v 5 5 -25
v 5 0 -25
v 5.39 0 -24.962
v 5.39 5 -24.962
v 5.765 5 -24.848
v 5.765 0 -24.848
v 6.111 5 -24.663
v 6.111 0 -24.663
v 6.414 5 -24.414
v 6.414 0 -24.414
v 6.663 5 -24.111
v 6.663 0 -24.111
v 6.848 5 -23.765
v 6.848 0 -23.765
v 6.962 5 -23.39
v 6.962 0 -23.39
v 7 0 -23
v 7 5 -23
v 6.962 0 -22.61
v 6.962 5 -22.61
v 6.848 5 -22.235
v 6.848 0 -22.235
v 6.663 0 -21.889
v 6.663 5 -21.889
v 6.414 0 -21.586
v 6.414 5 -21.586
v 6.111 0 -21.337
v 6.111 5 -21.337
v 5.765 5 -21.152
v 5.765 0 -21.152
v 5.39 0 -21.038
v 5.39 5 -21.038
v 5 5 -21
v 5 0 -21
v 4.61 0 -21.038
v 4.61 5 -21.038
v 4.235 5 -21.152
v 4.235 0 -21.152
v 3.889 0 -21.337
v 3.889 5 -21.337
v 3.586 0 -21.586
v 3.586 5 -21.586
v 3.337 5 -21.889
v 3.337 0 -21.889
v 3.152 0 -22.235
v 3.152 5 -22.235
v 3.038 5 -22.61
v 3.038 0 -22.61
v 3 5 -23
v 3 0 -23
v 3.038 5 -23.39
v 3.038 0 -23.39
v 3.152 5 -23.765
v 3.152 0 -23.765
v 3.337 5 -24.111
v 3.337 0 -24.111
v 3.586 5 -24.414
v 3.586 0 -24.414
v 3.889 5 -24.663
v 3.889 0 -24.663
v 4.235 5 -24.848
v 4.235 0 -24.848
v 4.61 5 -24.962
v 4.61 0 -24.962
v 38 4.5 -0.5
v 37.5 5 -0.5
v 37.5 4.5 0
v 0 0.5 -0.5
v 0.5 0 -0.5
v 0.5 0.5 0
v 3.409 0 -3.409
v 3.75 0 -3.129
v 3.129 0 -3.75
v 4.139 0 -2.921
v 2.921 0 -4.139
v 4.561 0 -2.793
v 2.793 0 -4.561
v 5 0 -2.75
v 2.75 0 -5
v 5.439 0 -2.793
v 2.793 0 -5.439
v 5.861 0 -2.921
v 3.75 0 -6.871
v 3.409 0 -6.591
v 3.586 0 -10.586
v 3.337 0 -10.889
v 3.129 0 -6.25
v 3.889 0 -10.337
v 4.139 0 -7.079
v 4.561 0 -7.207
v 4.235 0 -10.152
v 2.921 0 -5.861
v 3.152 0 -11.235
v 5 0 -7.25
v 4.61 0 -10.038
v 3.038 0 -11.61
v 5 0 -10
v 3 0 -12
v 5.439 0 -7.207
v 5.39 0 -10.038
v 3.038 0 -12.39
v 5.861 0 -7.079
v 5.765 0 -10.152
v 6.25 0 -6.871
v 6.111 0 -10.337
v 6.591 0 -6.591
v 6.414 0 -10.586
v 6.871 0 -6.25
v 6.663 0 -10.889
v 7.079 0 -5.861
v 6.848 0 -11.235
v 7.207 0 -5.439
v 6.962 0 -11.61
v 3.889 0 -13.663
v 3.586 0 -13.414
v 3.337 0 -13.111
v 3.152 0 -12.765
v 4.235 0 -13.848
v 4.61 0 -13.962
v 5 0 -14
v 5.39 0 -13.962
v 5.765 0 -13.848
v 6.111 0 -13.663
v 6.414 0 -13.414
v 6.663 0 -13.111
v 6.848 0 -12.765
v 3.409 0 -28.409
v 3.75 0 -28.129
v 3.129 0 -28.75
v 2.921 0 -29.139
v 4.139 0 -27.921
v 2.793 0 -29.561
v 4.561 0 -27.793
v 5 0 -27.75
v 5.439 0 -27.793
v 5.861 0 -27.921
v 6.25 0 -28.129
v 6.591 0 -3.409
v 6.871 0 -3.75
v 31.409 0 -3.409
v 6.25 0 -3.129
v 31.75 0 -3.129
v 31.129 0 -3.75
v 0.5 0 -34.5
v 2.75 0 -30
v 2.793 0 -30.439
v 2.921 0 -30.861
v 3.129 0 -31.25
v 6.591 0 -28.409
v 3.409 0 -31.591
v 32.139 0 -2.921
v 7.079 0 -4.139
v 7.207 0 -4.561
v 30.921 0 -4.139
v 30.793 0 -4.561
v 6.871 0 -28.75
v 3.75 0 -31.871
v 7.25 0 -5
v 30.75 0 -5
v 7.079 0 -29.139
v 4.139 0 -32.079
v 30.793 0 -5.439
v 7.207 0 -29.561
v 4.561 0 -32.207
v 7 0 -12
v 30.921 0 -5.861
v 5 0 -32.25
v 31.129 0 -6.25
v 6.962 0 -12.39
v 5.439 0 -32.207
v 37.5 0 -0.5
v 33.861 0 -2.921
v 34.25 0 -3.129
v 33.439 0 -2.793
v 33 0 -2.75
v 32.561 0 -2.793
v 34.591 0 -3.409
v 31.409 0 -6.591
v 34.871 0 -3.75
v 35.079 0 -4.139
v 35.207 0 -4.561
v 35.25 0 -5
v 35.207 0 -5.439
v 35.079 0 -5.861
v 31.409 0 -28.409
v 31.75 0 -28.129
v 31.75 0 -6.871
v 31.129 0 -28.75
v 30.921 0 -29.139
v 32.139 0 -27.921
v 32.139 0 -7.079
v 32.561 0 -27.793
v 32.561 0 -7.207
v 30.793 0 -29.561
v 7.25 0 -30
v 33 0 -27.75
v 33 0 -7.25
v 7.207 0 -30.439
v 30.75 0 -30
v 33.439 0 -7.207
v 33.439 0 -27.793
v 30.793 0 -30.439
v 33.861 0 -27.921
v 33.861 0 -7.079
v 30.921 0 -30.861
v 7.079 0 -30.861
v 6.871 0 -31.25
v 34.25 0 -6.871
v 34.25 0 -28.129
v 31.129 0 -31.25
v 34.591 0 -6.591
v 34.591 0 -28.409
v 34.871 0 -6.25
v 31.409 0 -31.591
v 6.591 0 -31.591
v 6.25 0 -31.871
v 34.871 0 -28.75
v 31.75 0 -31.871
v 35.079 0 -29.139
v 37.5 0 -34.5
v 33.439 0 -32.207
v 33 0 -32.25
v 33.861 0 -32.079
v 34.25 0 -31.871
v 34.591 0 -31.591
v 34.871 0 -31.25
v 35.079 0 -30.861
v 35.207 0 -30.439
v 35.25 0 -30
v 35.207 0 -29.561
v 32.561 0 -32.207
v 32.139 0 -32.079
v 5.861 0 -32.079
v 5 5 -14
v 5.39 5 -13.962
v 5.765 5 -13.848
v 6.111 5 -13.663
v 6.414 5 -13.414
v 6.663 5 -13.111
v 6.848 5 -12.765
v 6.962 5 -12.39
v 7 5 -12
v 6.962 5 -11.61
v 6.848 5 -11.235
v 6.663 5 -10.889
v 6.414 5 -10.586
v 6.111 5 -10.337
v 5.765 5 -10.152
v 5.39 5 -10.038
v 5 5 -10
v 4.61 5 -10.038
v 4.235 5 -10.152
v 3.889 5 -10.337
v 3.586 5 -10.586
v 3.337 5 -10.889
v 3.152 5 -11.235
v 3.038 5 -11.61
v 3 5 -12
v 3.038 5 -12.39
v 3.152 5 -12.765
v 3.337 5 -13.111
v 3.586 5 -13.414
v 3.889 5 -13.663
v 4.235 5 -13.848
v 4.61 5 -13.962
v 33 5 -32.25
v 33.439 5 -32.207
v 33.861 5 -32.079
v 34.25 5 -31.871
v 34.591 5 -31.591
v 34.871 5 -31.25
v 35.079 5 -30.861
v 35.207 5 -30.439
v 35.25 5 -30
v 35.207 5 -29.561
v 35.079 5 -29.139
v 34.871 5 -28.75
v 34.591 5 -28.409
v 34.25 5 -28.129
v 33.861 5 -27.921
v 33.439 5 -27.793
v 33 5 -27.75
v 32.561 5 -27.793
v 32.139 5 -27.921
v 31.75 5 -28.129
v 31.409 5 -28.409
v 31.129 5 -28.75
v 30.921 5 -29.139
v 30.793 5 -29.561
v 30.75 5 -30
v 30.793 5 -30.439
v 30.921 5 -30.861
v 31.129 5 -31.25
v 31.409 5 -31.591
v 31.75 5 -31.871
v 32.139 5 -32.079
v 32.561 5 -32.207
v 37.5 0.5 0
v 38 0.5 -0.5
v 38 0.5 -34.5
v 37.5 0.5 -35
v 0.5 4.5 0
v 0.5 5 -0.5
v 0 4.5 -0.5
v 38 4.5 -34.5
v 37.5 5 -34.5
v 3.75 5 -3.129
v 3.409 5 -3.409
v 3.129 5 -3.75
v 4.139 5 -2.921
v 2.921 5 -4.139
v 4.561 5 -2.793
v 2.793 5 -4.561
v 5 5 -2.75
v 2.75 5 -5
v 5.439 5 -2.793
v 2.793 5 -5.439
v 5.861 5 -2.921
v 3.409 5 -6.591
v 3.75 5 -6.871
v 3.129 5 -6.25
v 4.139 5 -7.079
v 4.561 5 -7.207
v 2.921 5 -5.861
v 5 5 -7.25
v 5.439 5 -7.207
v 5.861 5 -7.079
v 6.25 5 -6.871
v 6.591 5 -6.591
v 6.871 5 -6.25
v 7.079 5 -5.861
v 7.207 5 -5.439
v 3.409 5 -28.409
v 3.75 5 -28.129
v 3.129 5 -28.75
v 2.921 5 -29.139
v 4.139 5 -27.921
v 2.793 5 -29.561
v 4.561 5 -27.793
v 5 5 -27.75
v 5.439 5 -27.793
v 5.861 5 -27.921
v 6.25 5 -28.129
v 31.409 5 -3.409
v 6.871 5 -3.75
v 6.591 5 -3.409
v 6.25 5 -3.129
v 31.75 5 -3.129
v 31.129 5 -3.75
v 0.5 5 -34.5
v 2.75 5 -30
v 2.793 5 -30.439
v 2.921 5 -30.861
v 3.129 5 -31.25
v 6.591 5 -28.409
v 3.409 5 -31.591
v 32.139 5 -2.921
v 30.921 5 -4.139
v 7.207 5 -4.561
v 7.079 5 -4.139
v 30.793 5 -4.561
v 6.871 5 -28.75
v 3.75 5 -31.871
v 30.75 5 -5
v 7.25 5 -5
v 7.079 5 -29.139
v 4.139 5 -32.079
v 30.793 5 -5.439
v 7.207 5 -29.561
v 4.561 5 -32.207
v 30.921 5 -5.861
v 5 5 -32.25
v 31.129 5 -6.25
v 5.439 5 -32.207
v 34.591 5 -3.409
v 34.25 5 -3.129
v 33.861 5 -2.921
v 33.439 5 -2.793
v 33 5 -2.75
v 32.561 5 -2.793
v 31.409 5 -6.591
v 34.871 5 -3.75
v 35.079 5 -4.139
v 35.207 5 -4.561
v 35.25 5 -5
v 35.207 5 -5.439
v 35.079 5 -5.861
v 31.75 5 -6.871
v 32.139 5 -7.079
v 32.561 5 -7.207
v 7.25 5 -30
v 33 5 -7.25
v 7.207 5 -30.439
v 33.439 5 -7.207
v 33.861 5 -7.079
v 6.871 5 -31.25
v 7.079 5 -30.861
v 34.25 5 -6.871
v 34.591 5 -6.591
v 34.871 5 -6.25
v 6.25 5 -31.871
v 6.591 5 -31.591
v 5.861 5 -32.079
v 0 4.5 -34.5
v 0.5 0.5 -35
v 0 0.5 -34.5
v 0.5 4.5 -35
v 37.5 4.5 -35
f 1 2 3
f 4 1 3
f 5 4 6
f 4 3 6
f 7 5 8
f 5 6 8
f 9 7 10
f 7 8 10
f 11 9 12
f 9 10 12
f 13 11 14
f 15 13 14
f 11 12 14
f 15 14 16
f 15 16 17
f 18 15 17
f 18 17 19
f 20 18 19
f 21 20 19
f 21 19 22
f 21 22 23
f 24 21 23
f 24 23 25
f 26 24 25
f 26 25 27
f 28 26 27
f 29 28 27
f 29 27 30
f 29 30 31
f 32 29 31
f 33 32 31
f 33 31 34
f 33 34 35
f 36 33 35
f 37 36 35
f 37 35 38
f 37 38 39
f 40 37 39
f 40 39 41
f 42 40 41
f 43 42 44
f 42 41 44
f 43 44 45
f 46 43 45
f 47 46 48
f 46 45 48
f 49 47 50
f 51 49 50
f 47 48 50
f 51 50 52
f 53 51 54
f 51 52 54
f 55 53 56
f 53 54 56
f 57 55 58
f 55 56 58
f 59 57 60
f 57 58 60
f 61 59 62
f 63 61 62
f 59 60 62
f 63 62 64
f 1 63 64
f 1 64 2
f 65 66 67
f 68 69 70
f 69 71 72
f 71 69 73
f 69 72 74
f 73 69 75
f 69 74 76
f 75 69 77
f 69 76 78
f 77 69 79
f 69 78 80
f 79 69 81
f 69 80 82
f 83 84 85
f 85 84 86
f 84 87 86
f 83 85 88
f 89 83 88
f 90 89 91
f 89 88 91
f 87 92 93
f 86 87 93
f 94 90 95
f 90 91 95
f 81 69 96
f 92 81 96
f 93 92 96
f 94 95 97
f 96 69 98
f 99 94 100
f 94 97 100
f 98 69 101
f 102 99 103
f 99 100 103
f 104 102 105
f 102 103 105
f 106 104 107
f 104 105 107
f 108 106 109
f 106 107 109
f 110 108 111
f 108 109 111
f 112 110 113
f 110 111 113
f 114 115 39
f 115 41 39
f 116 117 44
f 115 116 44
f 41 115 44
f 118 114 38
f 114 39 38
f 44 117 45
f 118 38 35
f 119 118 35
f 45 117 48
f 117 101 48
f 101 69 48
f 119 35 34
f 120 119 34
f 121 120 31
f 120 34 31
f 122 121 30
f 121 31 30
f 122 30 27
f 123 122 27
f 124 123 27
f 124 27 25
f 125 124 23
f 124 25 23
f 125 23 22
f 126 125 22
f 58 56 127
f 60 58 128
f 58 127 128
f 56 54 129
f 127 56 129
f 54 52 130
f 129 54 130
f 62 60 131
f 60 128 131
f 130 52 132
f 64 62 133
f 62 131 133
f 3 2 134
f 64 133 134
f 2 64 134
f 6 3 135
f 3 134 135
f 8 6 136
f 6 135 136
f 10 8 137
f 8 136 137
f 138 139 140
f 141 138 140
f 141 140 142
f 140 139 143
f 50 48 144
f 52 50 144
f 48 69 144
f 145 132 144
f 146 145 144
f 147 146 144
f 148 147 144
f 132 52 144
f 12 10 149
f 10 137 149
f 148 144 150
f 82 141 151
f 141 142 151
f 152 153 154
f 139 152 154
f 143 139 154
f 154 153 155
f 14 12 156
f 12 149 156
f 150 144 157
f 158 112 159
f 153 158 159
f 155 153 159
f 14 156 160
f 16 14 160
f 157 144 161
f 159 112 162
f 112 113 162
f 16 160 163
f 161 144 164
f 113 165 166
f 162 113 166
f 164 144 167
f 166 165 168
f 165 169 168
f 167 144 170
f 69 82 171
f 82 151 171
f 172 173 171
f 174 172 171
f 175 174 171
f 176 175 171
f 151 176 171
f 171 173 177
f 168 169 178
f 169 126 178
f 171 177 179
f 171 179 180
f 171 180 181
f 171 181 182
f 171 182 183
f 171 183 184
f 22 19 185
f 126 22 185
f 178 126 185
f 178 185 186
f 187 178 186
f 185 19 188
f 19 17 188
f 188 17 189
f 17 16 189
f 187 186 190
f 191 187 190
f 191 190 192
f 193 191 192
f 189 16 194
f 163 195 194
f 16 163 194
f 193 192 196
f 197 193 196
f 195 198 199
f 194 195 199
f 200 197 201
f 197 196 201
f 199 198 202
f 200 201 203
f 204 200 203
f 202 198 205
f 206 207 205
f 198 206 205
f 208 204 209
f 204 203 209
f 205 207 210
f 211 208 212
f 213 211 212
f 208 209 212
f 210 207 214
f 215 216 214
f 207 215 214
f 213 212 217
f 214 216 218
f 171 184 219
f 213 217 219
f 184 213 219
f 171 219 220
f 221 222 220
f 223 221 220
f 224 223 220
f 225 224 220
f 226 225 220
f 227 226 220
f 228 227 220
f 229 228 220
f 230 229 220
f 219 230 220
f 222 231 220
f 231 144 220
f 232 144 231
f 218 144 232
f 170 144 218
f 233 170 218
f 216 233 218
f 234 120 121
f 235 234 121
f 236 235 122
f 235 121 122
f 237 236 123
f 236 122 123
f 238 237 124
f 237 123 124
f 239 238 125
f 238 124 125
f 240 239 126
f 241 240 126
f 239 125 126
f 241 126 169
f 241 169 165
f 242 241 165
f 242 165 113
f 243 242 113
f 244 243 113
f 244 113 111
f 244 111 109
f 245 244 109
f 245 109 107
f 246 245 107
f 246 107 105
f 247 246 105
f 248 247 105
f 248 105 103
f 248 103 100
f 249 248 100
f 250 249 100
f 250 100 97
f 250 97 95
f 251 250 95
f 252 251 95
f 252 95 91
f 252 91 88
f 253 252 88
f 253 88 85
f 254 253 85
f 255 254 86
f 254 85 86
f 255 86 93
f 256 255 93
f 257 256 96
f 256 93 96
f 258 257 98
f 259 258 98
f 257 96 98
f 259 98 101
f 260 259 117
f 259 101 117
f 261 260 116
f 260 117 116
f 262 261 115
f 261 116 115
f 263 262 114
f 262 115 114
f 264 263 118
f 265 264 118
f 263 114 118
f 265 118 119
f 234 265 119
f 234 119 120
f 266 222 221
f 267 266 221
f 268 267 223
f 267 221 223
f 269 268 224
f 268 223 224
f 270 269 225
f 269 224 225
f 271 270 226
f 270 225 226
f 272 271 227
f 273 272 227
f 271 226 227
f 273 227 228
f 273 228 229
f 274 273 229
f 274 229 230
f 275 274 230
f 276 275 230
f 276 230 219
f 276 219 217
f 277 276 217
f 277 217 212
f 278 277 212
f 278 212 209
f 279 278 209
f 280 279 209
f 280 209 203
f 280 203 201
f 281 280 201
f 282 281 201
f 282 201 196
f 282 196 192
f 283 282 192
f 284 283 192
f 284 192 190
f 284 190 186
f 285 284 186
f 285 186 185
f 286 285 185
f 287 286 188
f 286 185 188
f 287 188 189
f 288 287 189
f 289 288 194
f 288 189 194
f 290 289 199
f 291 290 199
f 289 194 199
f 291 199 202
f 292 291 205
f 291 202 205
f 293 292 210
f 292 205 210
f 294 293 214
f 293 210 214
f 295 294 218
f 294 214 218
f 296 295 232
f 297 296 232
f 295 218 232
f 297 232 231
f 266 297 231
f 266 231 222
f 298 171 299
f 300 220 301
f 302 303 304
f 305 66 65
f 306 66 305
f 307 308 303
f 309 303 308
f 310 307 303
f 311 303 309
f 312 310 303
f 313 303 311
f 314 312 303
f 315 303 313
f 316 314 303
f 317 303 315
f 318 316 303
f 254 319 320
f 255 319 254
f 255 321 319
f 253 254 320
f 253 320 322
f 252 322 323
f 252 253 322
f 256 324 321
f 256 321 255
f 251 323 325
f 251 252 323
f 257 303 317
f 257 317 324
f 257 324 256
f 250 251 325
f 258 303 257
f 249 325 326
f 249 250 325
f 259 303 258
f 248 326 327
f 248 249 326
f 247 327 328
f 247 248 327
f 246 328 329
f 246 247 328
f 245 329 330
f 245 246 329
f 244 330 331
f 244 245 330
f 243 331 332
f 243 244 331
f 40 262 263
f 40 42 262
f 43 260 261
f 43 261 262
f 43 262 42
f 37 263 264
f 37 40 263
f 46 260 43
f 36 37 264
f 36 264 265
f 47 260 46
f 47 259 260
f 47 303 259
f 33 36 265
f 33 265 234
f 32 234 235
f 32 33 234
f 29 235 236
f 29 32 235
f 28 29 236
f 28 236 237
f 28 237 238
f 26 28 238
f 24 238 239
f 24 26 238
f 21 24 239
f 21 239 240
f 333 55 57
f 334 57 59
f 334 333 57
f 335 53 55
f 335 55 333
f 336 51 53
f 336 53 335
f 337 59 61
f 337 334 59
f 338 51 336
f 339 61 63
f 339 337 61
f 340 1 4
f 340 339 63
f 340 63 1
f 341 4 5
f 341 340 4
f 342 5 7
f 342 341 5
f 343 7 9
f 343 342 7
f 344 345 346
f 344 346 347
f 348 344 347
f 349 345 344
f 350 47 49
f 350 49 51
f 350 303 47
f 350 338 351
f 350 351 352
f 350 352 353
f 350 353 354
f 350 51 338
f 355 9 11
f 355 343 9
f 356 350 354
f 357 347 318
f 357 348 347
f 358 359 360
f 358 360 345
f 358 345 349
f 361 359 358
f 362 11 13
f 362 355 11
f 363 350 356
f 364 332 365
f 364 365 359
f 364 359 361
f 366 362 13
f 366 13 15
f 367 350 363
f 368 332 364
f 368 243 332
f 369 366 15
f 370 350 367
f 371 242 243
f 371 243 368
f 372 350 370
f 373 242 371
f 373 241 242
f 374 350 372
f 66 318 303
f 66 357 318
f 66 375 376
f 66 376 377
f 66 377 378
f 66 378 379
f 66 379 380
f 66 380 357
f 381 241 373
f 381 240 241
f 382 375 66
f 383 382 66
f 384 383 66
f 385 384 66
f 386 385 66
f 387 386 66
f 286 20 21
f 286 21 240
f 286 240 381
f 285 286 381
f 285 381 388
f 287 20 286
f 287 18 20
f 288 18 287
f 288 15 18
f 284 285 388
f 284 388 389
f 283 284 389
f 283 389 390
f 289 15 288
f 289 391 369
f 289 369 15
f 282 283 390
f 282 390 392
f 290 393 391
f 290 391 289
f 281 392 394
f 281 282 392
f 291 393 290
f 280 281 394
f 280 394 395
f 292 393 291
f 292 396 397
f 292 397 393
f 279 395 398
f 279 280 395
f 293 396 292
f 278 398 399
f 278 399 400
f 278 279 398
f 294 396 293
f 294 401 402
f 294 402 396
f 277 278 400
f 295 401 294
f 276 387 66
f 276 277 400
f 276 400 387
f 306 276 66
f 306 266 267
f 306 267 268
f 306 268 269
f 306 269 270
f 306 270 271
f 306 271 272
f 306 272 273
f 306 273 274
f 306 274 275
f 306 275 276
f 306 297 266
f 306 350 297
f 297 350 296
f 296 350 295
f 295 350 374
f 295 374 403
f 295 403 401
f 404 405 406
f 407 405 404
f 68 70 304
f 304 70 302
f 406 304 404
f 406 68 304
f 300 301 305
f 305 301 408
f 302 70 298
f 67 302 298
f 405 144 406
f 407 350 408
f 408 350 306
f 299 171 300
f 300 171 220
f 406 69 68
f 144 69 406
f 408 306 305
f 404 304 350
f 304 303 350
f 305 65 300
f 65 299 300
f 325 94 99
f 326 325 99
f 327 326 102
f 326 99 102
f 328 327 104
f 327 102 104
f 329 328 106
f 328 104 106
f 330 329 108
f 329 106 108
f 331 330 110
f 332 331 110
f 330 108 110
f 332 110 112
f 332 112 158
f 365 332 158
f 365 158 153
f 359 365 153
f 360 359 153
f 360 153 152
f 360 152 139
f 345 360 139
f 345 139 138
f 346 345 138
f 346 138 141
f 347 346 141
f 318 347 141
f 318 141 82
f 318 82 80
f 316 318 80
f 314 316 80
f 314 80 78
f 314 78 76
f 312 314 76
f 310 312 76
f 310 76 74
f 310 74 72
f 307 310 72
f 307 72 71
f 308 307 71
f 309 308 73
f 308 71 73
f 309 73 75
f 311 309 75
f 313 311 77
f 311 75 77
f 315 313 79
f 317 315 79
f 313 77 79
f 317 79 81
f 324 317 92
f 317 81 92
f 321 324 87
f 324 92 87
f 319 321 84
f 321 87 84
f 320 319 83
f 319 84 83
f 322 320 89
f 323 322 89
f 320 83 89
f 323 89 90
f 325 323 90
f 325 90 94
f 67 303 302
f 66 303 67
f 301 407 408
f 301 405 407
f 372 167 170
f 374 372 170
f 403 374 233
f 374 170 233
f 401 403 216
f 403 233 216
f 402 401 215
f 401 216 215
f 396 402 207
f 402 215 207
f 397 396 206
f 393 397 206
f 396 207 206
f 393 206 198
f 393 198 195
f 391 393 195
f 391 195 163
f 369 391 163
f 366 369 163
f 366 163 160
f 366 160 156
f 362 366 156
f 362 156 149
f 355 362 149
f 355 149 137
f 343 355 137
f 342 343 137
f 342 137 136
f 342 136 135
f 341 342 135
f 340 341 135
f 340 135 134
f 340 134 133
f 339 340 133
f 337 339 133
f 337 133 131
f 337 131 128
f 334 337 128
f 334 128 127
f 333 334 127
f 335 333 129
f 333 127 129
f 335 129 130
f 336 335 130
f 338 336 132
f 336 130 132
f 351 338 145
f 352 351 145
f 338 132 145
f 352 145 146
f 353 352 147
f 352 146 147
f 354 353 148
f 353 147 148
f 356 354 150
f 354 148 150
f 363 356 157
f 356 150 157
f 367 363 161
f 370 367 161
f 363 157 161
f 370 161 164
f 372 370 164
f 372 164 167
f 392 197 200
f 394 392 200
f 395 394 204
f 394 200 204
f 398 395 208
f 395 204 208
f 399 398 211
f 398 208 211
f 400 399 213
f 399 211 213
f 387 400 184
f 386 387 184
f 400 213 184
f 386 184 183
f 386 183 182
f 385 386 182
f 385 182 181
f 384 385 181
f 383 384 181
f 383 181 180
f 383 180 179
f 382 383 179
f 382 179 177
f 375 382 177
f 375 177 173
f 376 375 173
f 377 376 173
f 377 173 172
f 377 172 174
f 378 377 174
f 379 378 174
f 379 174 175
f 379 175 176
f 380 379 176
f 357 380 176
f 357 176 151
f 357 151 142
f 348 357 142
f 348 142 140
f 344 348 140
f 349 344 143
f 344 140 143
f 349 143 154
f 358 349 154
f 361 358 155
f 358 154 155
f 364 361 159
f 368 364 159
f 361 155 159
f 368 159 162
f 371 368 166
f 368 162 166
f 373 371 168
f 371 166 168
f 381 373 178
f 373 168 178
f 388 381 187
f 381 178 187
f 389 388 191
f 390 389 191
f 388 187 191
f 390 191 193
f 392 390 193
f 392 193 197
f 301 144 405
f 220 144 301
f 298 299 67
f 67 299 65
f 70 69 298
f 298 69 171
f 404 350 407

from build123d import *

# Parameters (mm, degrees)
SKETCH_1_W          = 38
SKETCH_1_H          = 35
EXTRUDE_1_DEPTH     = 5
CHAMFER_1_SIZE      = 0.5
SKETCH_2_R          = 2.25
SKETCH_2_R_2        = 2
CUT_EXTRUDE_1_DEPTH = 52.903757089


with BuildPart() as part:
    # 草图1 → 凸台-拉伸1 (new body)
    with BuildSketch(Plane(origin=(0, 0, 0), x_dir=(1, 0, 0), z_dir=(0, 1, 0))):
        with Locations((19, 17.5)):
            Rectangle(SKETCH_1_W, SKETCH_1_H)
    extrude(amount=EXTRUDE_1_DEPTH)

    # 倒角1
    chamfer_1_edges = [part.edges().sort_by_distance(p)[0] for p in [
        (38, 5, -17.5),
        (19, 5, -35),
        (0, 5, -17.5),
        (19, 0, -35),
        (38, 0, -17.5),
        (19, 0, 0),
        (0, 0, -17.5),
        (19, 5, 0),
        (0, 2.5, -35),
        (38, 2.5, -35),
        (38, 2.5, 0),
        (0, 2.5, 0),
    ]]
    chamfer(chamfer_1_edges, length=CHAMFER_1_SIZE)

    # 草图2 → 切除-拉伸1 (cut, through all)
    with BuildSketch(Plane.XZ):
        with Locations(Location((5, -5, 0), (0, 0, 270))):
            Circle(SKETCH_2_R)
        with Locations(Location((5, -30, 0), (0, 0, 270))):
            Circle(SKETCH_2_R)
        with Locations(Location((33, -30, 0), (0, 0, 270))):
            Circle(SKETCH_2_R)
        with Locations(Location((33, -5, 0), (0, 0, 270))):
            Circle(SKETCH_2_R)
        with Locations(Location((5, -12, 0), (0, 0, 270))):
            Circle(SKETCH_2_R_2)
        with Locations(Location((5, -23, 0), (0, 0, 270))):
            Circle(SKETCH_2_R_2)
    extrude(amount=-CUT_EXTRUDE_1_DEPTH, mode=Mode.SUBTRACT)


solid = part.part
